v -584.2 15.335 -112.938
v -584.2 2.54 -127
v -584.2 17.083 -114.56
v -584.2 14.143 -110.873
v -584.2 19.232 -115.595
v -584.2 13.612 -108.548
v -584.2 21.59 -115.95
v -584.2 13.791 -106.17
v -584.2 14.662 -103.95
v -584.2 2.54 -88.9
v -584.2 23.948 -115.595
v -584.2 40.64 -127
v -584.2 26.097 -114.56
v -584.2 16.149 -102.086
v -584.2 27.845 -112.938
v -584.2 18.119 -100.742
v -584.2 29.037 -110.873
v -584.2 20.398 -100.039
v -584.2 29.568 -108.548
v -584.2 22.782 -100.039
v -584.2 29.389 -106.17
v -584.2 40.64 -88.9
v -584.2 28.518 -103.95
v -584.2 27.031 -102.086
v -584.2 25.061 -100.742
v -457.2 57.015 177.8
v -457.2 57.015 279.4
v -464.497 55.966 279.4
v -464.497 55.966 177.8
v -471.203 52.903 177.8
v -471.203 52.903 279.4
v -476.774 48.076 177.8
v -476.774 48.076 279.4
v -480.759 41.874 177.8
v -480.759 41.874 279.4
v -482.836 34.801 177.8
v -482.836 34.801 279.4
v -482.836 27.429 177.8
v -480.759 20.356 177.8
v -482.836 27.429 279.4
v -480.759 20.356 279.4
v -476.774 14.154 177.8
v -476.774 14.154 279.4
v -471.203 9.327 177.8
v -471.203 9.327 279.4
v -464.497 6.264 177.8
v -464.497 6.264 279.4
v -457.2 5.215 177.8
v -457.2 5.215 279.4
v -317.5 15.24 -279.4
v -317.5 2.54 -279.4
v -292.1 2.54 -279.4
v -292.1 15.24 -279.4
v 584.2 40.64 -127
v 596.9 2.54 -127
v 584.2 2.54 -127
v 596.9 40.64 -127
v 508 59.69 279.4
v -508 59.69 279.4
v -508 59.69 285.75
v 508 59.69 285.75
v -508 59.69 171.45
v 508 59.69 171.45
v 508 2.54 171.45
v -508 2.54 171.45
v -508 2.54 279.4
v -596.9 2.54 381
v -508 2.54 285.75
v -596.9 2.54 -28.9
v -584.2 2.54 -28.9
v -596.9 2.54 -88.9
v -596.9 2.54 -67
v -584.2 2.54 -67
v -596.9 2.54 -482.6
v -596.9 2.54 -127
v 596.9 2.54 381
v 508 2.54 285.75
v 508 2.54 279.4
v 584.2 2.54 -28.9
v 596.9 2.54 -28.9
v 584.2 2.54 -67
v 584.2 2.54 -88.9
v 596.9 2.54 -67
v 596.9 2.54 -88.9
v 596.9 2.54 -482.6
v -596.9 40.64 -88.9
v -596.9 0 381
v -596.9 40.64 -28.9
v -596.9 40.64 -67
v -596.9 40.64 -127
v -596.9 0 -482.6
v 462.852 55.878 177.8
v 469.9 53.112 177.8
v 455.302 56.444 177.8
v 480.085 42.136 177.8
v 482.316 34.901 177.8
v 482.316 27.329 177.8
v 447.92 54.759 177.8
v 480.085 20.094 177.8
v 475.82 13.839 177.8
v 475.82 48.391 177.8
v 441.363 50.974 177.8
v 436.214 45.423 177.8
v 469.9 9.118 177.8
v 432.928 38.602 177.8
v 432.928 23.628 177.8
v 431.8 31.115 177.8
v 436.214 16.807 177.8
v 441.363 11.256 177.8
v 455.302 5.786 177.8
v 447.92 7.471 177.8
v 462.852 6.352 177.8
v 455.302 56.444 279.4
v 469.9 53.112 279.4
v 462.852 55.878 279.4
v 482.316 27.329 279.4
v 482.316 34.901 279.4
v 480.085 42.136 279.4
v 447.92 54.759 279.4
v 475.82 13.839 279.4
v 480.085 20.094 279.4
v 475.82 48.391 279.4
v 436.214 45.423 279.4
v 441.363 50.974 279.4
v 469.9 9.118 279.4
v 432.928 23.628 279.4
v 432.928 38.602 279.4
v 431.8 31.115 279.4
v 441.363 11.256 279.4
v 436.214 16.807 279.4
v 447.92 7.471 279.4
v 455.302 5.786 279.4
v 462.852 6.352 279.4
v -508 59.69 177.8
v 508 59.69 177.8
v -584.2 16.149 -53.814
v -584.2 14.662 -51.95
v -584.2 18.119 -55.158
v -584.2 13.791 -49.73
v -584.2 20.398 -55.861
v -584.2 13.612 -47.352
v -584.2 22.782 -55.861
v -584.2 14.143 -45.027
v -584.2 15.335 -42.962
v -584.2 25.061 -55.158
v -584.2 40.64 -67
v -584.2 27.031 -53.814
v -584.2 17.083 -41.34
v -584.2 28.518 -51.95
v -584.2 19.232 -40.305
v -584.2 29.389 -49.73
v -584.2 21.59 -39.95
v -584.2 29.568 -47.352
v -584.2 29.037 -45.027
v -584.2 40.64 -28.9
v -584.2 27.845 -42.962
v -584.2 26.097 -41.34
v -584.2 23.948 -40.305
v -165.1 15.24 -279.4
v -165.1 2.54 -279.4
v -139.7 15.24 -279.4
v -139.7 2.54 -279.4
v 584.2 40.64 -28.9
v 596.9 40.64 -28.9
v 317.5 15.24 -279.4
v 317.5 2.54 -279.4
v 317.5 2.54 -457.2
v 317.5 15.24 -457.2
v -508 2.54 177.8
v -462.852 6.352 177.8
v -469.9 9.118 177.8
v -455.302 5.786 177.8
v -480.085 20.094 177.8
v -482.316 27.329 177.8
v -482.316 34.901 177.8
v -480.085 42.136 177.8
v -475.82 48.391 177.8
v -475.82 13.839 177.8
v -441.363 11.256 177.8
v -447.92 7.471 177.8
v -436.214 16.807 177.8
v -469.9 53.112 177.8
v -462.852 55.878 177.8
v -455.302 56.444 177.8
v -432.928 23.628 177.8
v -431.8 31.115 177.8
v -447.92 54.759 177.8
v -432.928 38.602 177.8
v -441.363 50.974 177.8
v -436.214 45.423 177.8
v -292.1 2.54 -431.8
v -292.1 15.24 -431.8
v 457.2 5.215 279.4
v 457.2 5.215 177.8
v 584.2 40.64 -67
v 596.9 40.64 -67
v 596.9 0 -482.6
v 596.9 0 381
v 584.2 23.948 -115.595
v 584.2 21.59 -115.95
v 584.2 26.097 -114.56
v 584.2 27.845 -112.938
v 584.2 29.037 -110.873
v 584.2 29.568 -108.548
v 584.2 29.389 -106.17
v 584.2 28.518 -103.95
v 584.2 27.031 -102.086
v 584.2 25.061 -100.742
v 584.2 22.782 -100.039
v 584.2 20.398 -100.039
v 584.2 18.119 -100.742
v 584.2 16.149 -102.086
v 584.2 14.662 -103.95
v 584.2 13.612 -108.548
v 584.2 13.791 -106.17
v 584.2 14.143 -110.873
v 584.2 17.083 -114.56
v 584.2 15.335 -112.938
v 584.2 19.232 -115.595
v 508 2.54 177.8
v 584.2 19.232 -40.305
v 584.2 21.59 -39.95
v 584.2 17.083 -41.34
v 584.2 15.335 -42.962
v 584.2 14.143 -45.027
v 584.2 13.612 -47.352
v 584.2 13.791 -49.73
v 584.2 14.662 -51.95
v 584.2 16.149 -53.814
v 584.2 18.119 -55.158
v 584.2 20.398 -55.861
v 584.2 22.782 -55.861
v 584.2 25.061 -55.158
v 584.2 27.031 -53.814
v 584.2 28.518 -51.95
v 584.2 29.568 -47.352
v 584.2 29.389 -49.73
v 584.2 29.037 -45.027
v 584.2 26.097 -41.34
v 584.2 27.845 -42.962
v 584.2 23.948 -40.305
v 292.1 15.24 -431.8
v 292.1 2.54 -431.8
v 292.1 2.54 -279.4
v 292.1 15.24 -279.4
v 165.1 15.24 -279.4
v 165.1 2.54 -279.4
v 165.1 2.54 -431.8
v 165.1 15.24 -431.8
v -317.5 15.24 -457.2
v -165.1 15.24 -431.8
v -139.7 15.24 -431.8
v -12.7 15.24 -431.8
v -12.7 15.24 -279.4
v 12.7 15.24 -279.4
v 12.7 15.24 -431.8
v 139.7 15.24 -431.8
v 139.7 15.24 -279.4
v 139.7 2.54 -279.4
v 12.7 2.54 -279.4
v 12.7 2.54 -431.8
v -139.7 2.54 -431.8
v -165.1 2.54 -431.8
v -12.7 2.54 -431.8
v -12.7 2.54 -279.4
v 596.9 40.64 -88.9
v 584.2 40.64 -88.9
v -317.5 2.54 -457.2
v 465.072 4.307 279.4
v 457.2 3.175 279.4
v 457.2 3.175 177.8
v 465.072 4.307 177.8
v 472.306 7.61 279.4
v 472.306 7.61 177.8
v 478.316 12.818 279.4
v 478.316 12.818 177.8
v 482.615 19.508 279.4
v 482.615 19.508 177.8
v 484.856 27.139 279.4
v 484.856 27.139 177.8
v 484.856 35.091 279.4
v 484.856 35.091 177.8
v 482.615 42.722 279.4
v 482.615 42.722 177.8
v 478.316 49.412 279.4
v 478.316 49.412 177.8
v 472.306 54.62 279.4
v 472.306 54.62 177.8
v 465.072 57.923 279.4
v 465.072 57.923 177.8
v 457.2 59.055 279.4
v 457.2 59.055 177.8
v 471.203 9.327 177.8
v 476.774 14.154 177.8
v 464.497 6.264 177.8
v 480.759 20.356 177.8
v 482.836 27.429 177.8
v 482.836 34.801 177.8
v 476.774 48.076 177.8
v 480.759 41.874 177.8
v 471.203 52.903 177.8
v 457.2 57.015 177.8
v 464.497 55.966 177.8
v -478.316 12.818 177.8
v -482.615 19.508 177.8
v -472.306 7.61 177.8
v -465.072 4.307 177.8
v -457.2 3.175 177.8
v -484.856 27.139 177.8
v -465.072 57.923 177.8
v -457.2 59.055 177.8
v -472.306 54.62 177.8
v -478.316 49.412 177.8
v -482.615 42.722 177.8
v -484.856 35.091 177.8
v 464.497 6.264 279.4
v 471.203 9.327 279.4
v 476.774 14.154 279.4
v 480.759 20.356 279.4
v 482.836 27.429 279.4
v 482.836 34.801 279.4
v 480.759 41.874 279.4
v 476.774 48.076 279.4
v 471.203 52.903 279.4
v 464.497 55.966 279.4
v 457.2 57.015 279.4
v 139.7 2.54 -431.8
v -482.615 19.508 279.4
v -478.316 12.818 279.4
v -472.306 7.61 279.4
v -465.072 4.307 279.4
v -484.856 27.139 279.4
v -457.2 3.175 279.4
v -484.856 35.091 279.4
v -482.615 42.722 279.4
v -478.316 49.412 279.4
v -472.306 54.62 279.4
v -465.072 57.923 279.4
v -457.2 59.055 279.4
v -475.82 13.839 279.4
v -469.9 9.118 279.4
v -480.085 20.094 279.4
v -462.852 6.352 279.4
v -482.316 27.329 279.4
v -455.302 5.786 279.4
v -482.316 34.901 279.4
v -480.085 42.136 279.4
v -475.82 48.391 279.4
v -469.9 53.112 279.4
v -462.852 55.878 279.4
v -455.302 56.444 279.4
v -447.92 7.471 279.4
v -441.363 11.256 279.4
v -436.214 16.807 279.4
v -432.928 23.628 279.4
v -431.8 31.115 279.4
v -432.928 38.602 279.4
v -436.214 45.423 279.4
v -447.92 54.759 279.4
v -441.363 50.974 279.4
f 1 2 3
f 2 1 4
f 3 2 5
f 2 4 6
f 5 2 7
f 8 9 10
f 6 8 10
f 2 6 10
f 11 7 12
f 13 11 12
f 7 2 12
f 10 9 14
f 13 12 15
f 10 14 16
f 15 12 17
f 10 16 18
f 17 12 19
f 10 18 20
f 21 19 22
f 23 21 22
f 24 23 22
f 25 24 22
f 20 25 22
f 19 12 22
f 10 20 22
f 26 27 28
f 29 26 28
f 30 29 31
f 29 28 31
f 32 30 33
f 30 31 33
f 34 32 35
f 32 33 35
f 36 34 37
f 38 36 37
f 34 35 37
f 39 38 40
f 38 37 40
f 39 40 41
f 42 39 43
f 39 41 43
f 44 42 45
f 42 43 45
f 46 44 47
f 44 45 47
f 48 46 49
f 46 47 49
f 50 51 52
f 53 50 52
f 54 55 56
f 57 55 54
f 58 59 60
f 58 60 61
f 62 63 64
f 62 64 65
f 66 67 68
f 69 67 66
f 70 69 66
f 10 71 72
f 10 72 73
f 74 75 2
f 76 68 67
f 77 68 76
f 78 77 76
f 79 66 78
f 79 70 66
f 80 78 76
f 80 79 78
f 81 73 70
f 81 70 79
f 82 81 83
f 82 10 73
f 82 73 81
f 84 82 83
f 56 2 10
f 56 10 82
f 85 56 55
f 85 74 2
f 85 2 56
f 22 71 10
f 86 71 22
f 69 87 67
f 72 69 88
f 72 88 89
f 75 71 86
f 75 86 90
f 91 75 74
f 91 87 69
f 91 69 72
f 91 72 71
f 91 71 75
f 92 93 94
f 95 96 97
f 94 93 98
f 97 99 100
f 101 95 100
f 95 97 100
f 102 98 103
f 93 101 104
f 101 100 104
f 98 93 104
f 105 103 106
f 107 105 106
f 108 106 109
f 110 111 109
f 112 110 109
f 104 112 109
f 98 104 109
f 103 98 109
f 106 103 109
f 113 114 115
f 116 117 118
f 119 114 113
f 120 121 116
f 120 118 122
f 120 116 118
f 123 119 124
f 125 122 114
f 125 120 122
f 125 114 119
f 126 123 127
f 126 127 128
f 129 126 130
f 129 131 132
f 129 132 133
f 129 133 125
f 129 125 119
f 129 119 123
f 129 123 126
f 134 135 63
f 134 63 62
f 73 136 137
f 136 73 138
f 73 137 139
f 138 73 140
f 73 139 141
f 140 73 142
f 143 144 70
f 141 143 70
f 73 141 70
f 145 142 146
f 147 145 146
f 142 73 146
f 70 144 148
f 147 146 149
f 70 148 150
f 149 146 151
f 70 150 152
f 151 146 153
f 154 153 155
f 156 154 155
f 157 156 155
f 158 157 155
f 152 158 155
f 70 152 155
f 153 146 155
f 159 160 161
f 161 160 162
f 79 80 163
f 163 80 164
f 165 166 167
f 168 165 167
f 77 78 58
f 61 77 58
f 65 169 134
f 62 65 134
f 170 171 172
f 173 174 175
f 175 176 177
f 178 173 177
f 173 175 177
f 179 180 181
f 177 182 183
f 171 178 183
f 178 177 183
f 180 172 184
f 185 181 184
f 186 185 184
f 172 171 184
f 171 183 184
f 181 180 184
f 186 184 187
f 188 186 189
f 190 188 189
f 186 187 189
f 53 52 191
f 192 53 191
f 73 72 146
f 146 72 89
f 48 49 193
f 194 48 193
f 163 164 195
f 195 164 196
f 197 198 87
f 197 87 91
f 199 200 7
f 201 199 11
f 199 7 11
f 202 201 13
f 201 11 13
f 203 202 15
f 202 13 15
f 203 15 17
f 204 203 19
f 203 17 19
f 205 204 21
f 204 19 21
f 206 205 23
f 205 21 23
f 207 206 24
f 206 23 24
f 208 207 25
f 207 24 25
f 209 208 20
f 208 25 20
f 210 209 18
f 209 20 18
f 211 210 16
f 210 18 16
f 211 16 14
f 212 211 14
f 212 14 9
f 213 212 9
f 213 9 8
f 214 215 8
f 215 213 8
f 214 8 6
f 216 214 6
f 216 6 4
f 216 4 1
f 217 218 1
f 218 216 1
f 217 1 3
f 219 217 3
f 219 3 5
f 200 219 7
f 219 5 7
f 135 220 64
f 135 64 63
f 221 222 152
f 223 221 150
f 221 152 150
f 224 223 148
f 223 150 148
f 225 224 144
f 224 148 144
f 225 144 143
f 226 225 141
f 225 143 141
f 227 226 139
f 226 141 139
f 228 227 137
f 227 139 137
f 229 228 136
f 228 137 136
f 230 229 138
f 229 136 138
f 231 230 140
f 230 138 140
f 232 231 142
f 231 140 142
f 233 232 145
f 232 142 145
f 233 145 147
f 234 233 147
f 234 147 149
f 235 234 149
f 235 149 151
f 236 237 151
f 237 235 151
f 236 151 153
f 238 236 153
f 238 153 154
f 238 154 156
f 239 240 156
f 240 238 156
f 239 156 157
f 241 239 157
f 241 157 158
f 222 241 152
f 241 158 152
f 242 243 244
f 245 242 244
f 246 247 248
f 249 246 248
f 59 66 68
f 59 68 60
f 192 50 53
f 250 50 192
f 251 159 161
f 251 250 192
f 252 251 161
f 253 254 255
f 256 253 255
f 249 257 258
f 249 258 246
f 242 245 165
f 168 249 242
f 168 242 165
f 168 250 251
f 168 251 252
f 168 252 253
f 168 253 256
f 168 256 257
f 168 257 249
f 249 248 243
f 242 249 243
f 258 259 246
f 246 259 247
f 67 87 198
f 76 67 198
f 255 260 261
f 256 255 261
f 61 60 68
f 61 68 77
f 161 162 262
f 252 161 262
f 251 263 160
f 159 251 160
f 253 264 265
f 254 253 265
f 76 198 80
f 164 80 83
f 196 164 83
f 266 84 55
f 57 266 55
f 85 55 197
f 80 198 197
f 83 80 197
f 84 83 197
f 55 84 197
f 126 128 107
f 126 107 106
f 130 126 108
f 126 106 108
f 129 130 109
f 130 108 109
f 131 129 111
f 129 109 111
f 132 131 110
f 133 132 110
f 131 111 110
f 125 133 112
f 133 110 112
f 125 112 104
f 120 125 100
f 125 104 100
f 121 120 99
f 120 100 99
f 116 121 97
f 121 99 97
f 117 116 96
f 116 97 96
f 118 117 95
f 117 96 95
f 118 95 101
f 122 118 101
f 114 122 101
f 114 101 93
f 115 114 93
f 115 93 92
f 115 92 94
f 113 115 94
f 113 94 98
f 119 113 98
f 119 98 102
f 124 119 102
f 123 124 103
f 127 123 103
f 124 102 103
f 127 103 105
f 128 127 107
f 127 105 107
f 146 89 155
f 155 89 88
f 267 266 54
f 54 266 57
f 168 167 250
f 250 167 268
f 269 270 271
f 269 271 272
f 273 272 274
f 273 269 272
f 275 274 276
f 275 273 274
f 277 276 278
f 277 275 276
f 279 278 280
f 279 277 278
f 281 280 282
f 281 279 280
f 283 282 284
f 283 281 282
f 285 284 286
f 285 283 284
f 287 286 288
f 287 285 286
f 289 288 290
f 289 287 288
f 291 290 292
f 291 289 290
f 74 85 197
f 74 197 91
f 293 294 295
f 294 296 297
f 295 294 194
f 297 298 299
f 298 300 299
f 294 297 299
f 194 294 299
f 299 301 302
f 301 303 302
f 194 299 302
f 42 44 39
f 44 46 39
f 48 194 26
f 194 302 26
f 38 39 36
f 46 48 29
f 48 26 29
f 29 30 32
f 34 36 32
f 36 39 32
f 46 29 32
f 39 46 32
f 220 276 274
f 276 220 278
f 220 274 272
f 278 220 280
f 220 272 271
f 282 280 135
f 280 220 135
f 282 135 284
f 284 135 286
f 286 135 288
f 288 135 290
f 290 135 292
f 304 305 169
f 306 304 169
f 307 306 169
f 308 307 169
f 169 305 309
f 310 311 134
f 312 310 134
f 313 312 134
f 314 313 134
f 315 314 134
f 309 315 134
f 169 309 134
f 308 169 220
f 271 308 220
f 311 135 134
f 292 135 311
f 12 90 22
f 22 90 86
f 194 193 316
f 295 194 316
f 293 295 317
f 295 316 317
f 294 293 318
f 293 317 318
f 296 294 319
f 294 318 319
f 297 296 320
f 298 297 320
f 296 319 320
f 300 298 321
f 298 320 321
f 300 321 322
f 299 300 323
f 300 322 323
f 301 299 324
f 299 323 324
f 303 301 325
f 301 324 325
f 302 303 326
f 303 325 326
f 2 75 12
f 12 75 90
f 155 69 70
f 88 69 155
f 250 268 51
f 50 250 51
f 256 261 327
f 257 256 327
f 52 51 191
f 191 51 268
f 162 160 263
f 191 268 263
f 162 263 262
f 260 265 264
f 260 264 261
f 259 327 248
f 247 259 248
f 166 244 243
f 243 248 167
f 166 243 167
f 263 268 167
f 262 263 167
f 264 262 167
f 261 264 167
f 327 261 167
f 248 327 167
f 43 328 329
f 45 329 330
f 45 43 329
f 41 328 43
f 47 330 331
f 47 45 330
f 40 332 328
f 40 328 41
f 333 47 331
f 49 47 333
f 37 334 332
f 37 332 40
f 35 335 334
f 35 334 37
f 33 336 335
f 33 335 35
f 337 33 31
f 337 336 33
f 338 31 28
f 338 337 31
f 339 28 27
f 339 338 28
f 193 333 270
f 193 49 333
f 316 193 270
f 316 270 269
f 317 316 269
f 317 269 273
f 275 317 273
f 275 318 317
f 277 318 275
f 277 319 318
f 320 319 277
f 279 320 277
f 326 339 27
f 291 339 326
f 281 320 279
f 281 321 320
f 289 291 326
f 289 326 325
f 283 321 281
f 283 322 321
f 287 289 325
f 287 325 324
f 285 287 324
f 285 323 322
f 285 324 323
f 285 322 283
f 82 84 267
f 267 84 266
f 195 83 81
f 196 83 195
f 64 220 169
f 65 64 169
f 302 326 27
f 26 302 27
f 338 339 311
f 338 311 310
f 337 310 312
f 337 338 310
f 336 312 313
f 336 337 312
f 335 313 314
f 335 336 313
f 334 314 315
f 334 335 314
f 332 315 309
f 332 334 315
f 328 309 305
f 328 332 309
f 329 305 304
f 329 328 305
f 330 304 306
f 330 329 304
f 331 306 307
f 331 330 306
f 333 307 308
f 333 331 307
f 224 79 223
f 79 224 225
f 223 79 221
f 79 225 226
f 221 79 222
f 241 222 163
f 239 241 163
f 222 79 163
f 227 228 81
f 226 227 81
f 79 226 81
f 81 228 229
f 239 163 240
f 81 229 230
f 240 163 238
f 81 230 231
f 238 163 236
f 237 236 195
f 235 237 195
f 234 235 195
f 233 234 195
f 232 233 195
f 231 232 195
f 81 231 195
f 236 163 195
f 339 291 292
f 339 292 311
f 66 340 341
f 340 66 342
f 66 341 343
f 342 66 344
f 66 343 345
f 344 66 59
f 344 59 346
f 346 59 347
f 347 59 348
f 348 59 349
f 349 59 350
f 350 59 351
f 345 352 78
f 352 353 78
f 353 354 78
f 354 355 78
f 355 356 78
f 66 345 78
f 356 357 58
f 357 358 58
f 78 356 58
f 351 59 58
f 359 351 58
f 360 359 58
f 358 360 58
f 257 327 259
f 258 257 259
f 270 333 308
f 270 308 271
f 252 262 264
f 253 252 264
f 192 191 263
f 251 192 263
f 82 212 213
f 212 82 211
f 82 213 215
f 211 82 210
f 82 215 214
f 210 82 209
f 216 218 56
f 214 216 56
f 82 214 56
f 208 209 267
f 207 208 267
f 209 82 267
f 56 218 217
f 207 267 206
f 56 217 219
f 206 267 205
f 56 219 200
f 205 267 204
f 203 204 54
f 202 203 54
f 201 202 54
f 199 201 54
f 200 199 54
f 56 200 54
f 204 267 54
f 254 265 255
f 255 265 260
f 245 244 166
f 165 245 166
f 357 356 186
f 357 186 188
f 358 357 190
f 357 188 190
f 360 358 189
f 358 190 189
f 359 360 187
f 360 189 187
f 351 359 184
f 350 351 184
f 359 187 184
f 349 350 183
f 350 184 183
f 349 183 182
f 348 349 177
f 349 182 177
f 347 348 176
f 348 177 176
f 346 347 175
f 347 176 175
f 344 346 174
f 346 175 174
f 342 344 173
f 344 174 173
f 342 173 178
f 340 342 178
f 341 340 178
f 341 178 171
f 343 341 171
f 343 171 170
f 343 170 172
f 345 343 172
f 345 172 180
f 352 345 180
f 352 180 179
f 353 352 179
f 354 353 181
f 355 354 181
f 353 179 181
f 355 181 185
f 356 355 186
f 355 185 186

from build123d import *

# Parameters (mm, degrees)
SKETCH1_W                  = 1193.8
SKETCH1_H                  = 762
BOSS_EXTRUDE1_DEPTH        = 2.54
SKETCH2_W                  = 38.1
SKETCH2_H                  = 40.64
BOSS_EXTRUDE2_DEPTH        = 12.7
SKETCH3_W                  = 38.1
SKETCH3_H                  = 40.64
BOSS_EXTRUDE3_DEPTH        = 12.7
BOSS_EXTRUDE4_REACH        = 1243.696
SKETCH4_R                  = 8
BOSS_EXTRUDE5_DEPTH        = 50.8
BOSS_EXTRUDE5_DEPTH_BACK   = 50.8
SKETCH5_R                  = 25.4
BOSS_EXTRUDE5_2_DEPTH      = 50.8
BOSS_EXTRUDE5_2_DEPTH_BACK = 50.8
SKETCH6_W                  = 1016
SKETCH6_H                  = 57.15
BOSS_EXTRUDE6_DEPTH        = 6.35
BOSS_EXTRUDE8_DEPTH        = 101.6
SKETCH7_W                  = 1016
SKETCH7_H                  = 57.15
BOSS_EXTRUDE7_DEPTH        = 6.35
SKETCH12_W                 = 1193.8
SKETCH12_H                 = 2.54
BOSS_EXTRUDE9_DEPTH        = 101.6
BOSS_EXTRUDE10_DEPTH       = 12.7


with BuildPart() as part:
    # Sketch1 → Boss-Extrude1 (new body)
    with BuildSketch(Plane(origin=(0, 0, 0), x_dir=(1, 0, 0), z_dir=(0, 1, 0))):
        Rectangle(SKETCH1_W, SKETCH1_H)
    extrude(amount=BOSS_EXTRUDE1_DEPTH)

    # Sketch2 → Boss-Extrude2 (add)
    with BuildSketch(Plane.ZY.offset(596.9)):
        with Locations((-107.95, 20.32)):
            Rectangle(SKETCH2_W, SKETCH2_H)
        with Locations((-47.95, 20.32)):
            Rectangle(SKETCH2_W, SKETCH2_H)
    extrude(amount=-BOSS_EXTRUDE2_DEPTH)

    # Sketch3 → Boss-Extrude3 (add)
    with BuildSketch(Plane(origin=(596.9, 0, 0), x_dir=(0, 0, -1), z_dir=(1, 0, 0))):
        with Locations((47.95, 20.32)):
            Rectangle(SKETCH3_W, SKETCH3_H)
        with Locations((107.95, 20.32)):
            Rectangle(SKETCH3_W, SKETCH3_H)
    extrude(amount=-BOSS_EXTRUDE3_DEPTH)

    # Sketch4 → Boss-Extrude4 (add, up to next)
    with BuildSketch(Plane(origin=(-584.2, 0, 0), x_dir=(0, 0, -1), z_dir=(1, 0, 0)), mode=Mode.PRIVATE) as boss_extrude4_sk1:
        with Locations(Location((47.95, 21.59, 0), (0, 0, 180))):
            Circle(SKETCH4_R)
    boss_extrude4_tool1 = extrude(boss_extrude4_sk1.sketch, amount=BOSS_EXTRUDE4_REACH, mode=Mode.PRIVATE) - part.part
    # Sketch4 → Boss-Extrude4 (add, up to next)
    with BuildSketch(Plane(origin=(-584.2, 0, 0), x_dir=(0, 0, -1), z_dir=(1, 0, 0)), mode=Mode.PRIVATE) as boss_extrude4_sk2:
        with Locations((107.95, 21.59)):
            Circle(SKETCH4_R)
    boss_extrude4_tool2 = extrude(boss_extrude4_sk2.sketch, amount=BOSS_EXTRUDE4_REACH, mode=Mode.PRIVATE) - part.part
    add(boss_extrude4_tool1.solids().sort_by_distance((-584.2, 21.59, -47.95))[0])
    add(boss_extrude4_tool2.solids().sort_by_distance((-584.2, 21.59, -107.95))[0])



with BuildPart() as body_2:
    # Sketch5 → Boss-Extrude5 (new, two sides: drawn at the far end of the back side and taken through both)
    with BuildSketch(Plane.XY.offset(228.6).offset(-BOSS_EXTRUDE5_DEPTH_BACK)):
        with Locations((-457.2, 31.115)):
            Circle(SKETCH5_R)
    extrude(amount=BOSS_EXTRUDE5_DEPTH + BOSS_EXTRUDE5_DEPTH_BACK)


with BuildPart() as body_3:
    # Sketch5 → Boss-Extrude5 2 (new, two sides: drawn at the far end of the back side and taken through both)
    with BuildSketch(Plane.XY.offset(228.6).offset(-BOSS_EXTRUDE5_2_DEPTH_BACK)):
        with Locations(Location((457.2, 31.115, 0), (0, 0, 180))):
            Circle(SKETCH5_R)
    extrude(amount=BOSS_EXTRUDE5_2_DEPTH + BOSS_EXTRUDE5_2_DEPTH_BACK)


with BuildPart() as part_1:
    add(part.part)

    add(body_2.part)  # Boss-Extrude6 merges body 2
    # Sketch6 → Boss-Extrude6 (add)
    with BuildSketch(Plane.XY.offset(279.4)):
        with Locations((0, 31.115)):
            Rectangle(SKETCH6_W, SKETCH6_H)
    extrude(amount=BOSS_EXTRUDE6_DEPTH)


with BuildPart() as body_3_2:
    # Sketch11 → Boss-Extrude8 (new body)
    with BuildSketch(Plane(origin=(0, 0, 279.4), x_dir=(-1, 0, 0), z_dir=(0, 0, -1))):
        with BuildLine():
            Line((-457.2, 59.055), (457.2, 59.055))
            ThreePointArc((457.2, 59.055), (485.14, 31.115), (457.2, 3.175))
            Line((457.2, 3.175), (-457.2, 3.175))
            ThreePointArc((-457.2, 3.175), (-485.14, 31.115), (-457.2, 59.055))
        make_face()
        with BuildLine():
            Line((-457.2, 57.015), (457.2, 57.015))
            ThreePointArc((457.2, 57.015), (483.1, 31.115), (457.2, 5.215))
            Line((457.2, 5.215), (-457.2, 5.215))
            ThreePointArc((-457.2, 5.215), (-483.1, 31.115), (-457.2, 57.015))
        make_face(mode=Mode.SUBTRACT)
    extrude(amount=BOSS_EXTRUDE8_DEPTH)

    # Sketch7 → Boss-Extrude7 (add)
    with BuildSketch(Plane(origin=(0, 0, 177.8), x_dir=(-1, 0, 0), z_dir=(0, 0, -1))):
        with Locations((0, 31.115)):
            Rectangle(SKETCH7_W, SKETCH7_H)
    extrude(amount=BOSS_EXTRUDE7_DEPTH)


with BuildPart() as body_4:
    # Sketch12 → Boss-Extrude9 (new body)
    with BuildSketch(Plane(origin=(0, 0, -381), x_dir=(-1, 0, 0), z_dir=(0, 0, -1))):
        with Locations((0, 1.27)):
            Rectangle(SKETCH12_W, SKETCH12_H)
    extrude(amount=BOSS_EXTRUDE9_DEPTH)

    # Combine1: union part
    add(part_1.part)


with BuildPart() as body_5:
    # Sketch13 → Boss-Extrude10 (new body)
    with BuildSketch(Plane(origin=(0, 2.54, 0), x_dir=(1, 0, 0), z_dir=(0, 1, 0))):
        Polygon((317.5, 279.4), (317.5, 457.2), (-317.5, 457.2), (-317.5, 279.4), (-292.1, 279.4), (-292.1, 431.8), (-165.1, 431.8), (-165.1, 279.4), (-139.7, 279.4), (-139.7, 431.8), (-12.7, 431.8), (-12.7, 279.4), (12.7, 279.4), (12.7, 431.8), (139.7, 431.8), (139.7, 279.4), (165.1, 279.4), (165.1, 431.8), (292.1, 431.8), (292.1, 279.4), align=None)
    extrude(amount=BOSS_EXTRUDE10_DEPTH)


solid = Compound([body_3.part, body_3_2.part, body_4.part, body_5.part])
